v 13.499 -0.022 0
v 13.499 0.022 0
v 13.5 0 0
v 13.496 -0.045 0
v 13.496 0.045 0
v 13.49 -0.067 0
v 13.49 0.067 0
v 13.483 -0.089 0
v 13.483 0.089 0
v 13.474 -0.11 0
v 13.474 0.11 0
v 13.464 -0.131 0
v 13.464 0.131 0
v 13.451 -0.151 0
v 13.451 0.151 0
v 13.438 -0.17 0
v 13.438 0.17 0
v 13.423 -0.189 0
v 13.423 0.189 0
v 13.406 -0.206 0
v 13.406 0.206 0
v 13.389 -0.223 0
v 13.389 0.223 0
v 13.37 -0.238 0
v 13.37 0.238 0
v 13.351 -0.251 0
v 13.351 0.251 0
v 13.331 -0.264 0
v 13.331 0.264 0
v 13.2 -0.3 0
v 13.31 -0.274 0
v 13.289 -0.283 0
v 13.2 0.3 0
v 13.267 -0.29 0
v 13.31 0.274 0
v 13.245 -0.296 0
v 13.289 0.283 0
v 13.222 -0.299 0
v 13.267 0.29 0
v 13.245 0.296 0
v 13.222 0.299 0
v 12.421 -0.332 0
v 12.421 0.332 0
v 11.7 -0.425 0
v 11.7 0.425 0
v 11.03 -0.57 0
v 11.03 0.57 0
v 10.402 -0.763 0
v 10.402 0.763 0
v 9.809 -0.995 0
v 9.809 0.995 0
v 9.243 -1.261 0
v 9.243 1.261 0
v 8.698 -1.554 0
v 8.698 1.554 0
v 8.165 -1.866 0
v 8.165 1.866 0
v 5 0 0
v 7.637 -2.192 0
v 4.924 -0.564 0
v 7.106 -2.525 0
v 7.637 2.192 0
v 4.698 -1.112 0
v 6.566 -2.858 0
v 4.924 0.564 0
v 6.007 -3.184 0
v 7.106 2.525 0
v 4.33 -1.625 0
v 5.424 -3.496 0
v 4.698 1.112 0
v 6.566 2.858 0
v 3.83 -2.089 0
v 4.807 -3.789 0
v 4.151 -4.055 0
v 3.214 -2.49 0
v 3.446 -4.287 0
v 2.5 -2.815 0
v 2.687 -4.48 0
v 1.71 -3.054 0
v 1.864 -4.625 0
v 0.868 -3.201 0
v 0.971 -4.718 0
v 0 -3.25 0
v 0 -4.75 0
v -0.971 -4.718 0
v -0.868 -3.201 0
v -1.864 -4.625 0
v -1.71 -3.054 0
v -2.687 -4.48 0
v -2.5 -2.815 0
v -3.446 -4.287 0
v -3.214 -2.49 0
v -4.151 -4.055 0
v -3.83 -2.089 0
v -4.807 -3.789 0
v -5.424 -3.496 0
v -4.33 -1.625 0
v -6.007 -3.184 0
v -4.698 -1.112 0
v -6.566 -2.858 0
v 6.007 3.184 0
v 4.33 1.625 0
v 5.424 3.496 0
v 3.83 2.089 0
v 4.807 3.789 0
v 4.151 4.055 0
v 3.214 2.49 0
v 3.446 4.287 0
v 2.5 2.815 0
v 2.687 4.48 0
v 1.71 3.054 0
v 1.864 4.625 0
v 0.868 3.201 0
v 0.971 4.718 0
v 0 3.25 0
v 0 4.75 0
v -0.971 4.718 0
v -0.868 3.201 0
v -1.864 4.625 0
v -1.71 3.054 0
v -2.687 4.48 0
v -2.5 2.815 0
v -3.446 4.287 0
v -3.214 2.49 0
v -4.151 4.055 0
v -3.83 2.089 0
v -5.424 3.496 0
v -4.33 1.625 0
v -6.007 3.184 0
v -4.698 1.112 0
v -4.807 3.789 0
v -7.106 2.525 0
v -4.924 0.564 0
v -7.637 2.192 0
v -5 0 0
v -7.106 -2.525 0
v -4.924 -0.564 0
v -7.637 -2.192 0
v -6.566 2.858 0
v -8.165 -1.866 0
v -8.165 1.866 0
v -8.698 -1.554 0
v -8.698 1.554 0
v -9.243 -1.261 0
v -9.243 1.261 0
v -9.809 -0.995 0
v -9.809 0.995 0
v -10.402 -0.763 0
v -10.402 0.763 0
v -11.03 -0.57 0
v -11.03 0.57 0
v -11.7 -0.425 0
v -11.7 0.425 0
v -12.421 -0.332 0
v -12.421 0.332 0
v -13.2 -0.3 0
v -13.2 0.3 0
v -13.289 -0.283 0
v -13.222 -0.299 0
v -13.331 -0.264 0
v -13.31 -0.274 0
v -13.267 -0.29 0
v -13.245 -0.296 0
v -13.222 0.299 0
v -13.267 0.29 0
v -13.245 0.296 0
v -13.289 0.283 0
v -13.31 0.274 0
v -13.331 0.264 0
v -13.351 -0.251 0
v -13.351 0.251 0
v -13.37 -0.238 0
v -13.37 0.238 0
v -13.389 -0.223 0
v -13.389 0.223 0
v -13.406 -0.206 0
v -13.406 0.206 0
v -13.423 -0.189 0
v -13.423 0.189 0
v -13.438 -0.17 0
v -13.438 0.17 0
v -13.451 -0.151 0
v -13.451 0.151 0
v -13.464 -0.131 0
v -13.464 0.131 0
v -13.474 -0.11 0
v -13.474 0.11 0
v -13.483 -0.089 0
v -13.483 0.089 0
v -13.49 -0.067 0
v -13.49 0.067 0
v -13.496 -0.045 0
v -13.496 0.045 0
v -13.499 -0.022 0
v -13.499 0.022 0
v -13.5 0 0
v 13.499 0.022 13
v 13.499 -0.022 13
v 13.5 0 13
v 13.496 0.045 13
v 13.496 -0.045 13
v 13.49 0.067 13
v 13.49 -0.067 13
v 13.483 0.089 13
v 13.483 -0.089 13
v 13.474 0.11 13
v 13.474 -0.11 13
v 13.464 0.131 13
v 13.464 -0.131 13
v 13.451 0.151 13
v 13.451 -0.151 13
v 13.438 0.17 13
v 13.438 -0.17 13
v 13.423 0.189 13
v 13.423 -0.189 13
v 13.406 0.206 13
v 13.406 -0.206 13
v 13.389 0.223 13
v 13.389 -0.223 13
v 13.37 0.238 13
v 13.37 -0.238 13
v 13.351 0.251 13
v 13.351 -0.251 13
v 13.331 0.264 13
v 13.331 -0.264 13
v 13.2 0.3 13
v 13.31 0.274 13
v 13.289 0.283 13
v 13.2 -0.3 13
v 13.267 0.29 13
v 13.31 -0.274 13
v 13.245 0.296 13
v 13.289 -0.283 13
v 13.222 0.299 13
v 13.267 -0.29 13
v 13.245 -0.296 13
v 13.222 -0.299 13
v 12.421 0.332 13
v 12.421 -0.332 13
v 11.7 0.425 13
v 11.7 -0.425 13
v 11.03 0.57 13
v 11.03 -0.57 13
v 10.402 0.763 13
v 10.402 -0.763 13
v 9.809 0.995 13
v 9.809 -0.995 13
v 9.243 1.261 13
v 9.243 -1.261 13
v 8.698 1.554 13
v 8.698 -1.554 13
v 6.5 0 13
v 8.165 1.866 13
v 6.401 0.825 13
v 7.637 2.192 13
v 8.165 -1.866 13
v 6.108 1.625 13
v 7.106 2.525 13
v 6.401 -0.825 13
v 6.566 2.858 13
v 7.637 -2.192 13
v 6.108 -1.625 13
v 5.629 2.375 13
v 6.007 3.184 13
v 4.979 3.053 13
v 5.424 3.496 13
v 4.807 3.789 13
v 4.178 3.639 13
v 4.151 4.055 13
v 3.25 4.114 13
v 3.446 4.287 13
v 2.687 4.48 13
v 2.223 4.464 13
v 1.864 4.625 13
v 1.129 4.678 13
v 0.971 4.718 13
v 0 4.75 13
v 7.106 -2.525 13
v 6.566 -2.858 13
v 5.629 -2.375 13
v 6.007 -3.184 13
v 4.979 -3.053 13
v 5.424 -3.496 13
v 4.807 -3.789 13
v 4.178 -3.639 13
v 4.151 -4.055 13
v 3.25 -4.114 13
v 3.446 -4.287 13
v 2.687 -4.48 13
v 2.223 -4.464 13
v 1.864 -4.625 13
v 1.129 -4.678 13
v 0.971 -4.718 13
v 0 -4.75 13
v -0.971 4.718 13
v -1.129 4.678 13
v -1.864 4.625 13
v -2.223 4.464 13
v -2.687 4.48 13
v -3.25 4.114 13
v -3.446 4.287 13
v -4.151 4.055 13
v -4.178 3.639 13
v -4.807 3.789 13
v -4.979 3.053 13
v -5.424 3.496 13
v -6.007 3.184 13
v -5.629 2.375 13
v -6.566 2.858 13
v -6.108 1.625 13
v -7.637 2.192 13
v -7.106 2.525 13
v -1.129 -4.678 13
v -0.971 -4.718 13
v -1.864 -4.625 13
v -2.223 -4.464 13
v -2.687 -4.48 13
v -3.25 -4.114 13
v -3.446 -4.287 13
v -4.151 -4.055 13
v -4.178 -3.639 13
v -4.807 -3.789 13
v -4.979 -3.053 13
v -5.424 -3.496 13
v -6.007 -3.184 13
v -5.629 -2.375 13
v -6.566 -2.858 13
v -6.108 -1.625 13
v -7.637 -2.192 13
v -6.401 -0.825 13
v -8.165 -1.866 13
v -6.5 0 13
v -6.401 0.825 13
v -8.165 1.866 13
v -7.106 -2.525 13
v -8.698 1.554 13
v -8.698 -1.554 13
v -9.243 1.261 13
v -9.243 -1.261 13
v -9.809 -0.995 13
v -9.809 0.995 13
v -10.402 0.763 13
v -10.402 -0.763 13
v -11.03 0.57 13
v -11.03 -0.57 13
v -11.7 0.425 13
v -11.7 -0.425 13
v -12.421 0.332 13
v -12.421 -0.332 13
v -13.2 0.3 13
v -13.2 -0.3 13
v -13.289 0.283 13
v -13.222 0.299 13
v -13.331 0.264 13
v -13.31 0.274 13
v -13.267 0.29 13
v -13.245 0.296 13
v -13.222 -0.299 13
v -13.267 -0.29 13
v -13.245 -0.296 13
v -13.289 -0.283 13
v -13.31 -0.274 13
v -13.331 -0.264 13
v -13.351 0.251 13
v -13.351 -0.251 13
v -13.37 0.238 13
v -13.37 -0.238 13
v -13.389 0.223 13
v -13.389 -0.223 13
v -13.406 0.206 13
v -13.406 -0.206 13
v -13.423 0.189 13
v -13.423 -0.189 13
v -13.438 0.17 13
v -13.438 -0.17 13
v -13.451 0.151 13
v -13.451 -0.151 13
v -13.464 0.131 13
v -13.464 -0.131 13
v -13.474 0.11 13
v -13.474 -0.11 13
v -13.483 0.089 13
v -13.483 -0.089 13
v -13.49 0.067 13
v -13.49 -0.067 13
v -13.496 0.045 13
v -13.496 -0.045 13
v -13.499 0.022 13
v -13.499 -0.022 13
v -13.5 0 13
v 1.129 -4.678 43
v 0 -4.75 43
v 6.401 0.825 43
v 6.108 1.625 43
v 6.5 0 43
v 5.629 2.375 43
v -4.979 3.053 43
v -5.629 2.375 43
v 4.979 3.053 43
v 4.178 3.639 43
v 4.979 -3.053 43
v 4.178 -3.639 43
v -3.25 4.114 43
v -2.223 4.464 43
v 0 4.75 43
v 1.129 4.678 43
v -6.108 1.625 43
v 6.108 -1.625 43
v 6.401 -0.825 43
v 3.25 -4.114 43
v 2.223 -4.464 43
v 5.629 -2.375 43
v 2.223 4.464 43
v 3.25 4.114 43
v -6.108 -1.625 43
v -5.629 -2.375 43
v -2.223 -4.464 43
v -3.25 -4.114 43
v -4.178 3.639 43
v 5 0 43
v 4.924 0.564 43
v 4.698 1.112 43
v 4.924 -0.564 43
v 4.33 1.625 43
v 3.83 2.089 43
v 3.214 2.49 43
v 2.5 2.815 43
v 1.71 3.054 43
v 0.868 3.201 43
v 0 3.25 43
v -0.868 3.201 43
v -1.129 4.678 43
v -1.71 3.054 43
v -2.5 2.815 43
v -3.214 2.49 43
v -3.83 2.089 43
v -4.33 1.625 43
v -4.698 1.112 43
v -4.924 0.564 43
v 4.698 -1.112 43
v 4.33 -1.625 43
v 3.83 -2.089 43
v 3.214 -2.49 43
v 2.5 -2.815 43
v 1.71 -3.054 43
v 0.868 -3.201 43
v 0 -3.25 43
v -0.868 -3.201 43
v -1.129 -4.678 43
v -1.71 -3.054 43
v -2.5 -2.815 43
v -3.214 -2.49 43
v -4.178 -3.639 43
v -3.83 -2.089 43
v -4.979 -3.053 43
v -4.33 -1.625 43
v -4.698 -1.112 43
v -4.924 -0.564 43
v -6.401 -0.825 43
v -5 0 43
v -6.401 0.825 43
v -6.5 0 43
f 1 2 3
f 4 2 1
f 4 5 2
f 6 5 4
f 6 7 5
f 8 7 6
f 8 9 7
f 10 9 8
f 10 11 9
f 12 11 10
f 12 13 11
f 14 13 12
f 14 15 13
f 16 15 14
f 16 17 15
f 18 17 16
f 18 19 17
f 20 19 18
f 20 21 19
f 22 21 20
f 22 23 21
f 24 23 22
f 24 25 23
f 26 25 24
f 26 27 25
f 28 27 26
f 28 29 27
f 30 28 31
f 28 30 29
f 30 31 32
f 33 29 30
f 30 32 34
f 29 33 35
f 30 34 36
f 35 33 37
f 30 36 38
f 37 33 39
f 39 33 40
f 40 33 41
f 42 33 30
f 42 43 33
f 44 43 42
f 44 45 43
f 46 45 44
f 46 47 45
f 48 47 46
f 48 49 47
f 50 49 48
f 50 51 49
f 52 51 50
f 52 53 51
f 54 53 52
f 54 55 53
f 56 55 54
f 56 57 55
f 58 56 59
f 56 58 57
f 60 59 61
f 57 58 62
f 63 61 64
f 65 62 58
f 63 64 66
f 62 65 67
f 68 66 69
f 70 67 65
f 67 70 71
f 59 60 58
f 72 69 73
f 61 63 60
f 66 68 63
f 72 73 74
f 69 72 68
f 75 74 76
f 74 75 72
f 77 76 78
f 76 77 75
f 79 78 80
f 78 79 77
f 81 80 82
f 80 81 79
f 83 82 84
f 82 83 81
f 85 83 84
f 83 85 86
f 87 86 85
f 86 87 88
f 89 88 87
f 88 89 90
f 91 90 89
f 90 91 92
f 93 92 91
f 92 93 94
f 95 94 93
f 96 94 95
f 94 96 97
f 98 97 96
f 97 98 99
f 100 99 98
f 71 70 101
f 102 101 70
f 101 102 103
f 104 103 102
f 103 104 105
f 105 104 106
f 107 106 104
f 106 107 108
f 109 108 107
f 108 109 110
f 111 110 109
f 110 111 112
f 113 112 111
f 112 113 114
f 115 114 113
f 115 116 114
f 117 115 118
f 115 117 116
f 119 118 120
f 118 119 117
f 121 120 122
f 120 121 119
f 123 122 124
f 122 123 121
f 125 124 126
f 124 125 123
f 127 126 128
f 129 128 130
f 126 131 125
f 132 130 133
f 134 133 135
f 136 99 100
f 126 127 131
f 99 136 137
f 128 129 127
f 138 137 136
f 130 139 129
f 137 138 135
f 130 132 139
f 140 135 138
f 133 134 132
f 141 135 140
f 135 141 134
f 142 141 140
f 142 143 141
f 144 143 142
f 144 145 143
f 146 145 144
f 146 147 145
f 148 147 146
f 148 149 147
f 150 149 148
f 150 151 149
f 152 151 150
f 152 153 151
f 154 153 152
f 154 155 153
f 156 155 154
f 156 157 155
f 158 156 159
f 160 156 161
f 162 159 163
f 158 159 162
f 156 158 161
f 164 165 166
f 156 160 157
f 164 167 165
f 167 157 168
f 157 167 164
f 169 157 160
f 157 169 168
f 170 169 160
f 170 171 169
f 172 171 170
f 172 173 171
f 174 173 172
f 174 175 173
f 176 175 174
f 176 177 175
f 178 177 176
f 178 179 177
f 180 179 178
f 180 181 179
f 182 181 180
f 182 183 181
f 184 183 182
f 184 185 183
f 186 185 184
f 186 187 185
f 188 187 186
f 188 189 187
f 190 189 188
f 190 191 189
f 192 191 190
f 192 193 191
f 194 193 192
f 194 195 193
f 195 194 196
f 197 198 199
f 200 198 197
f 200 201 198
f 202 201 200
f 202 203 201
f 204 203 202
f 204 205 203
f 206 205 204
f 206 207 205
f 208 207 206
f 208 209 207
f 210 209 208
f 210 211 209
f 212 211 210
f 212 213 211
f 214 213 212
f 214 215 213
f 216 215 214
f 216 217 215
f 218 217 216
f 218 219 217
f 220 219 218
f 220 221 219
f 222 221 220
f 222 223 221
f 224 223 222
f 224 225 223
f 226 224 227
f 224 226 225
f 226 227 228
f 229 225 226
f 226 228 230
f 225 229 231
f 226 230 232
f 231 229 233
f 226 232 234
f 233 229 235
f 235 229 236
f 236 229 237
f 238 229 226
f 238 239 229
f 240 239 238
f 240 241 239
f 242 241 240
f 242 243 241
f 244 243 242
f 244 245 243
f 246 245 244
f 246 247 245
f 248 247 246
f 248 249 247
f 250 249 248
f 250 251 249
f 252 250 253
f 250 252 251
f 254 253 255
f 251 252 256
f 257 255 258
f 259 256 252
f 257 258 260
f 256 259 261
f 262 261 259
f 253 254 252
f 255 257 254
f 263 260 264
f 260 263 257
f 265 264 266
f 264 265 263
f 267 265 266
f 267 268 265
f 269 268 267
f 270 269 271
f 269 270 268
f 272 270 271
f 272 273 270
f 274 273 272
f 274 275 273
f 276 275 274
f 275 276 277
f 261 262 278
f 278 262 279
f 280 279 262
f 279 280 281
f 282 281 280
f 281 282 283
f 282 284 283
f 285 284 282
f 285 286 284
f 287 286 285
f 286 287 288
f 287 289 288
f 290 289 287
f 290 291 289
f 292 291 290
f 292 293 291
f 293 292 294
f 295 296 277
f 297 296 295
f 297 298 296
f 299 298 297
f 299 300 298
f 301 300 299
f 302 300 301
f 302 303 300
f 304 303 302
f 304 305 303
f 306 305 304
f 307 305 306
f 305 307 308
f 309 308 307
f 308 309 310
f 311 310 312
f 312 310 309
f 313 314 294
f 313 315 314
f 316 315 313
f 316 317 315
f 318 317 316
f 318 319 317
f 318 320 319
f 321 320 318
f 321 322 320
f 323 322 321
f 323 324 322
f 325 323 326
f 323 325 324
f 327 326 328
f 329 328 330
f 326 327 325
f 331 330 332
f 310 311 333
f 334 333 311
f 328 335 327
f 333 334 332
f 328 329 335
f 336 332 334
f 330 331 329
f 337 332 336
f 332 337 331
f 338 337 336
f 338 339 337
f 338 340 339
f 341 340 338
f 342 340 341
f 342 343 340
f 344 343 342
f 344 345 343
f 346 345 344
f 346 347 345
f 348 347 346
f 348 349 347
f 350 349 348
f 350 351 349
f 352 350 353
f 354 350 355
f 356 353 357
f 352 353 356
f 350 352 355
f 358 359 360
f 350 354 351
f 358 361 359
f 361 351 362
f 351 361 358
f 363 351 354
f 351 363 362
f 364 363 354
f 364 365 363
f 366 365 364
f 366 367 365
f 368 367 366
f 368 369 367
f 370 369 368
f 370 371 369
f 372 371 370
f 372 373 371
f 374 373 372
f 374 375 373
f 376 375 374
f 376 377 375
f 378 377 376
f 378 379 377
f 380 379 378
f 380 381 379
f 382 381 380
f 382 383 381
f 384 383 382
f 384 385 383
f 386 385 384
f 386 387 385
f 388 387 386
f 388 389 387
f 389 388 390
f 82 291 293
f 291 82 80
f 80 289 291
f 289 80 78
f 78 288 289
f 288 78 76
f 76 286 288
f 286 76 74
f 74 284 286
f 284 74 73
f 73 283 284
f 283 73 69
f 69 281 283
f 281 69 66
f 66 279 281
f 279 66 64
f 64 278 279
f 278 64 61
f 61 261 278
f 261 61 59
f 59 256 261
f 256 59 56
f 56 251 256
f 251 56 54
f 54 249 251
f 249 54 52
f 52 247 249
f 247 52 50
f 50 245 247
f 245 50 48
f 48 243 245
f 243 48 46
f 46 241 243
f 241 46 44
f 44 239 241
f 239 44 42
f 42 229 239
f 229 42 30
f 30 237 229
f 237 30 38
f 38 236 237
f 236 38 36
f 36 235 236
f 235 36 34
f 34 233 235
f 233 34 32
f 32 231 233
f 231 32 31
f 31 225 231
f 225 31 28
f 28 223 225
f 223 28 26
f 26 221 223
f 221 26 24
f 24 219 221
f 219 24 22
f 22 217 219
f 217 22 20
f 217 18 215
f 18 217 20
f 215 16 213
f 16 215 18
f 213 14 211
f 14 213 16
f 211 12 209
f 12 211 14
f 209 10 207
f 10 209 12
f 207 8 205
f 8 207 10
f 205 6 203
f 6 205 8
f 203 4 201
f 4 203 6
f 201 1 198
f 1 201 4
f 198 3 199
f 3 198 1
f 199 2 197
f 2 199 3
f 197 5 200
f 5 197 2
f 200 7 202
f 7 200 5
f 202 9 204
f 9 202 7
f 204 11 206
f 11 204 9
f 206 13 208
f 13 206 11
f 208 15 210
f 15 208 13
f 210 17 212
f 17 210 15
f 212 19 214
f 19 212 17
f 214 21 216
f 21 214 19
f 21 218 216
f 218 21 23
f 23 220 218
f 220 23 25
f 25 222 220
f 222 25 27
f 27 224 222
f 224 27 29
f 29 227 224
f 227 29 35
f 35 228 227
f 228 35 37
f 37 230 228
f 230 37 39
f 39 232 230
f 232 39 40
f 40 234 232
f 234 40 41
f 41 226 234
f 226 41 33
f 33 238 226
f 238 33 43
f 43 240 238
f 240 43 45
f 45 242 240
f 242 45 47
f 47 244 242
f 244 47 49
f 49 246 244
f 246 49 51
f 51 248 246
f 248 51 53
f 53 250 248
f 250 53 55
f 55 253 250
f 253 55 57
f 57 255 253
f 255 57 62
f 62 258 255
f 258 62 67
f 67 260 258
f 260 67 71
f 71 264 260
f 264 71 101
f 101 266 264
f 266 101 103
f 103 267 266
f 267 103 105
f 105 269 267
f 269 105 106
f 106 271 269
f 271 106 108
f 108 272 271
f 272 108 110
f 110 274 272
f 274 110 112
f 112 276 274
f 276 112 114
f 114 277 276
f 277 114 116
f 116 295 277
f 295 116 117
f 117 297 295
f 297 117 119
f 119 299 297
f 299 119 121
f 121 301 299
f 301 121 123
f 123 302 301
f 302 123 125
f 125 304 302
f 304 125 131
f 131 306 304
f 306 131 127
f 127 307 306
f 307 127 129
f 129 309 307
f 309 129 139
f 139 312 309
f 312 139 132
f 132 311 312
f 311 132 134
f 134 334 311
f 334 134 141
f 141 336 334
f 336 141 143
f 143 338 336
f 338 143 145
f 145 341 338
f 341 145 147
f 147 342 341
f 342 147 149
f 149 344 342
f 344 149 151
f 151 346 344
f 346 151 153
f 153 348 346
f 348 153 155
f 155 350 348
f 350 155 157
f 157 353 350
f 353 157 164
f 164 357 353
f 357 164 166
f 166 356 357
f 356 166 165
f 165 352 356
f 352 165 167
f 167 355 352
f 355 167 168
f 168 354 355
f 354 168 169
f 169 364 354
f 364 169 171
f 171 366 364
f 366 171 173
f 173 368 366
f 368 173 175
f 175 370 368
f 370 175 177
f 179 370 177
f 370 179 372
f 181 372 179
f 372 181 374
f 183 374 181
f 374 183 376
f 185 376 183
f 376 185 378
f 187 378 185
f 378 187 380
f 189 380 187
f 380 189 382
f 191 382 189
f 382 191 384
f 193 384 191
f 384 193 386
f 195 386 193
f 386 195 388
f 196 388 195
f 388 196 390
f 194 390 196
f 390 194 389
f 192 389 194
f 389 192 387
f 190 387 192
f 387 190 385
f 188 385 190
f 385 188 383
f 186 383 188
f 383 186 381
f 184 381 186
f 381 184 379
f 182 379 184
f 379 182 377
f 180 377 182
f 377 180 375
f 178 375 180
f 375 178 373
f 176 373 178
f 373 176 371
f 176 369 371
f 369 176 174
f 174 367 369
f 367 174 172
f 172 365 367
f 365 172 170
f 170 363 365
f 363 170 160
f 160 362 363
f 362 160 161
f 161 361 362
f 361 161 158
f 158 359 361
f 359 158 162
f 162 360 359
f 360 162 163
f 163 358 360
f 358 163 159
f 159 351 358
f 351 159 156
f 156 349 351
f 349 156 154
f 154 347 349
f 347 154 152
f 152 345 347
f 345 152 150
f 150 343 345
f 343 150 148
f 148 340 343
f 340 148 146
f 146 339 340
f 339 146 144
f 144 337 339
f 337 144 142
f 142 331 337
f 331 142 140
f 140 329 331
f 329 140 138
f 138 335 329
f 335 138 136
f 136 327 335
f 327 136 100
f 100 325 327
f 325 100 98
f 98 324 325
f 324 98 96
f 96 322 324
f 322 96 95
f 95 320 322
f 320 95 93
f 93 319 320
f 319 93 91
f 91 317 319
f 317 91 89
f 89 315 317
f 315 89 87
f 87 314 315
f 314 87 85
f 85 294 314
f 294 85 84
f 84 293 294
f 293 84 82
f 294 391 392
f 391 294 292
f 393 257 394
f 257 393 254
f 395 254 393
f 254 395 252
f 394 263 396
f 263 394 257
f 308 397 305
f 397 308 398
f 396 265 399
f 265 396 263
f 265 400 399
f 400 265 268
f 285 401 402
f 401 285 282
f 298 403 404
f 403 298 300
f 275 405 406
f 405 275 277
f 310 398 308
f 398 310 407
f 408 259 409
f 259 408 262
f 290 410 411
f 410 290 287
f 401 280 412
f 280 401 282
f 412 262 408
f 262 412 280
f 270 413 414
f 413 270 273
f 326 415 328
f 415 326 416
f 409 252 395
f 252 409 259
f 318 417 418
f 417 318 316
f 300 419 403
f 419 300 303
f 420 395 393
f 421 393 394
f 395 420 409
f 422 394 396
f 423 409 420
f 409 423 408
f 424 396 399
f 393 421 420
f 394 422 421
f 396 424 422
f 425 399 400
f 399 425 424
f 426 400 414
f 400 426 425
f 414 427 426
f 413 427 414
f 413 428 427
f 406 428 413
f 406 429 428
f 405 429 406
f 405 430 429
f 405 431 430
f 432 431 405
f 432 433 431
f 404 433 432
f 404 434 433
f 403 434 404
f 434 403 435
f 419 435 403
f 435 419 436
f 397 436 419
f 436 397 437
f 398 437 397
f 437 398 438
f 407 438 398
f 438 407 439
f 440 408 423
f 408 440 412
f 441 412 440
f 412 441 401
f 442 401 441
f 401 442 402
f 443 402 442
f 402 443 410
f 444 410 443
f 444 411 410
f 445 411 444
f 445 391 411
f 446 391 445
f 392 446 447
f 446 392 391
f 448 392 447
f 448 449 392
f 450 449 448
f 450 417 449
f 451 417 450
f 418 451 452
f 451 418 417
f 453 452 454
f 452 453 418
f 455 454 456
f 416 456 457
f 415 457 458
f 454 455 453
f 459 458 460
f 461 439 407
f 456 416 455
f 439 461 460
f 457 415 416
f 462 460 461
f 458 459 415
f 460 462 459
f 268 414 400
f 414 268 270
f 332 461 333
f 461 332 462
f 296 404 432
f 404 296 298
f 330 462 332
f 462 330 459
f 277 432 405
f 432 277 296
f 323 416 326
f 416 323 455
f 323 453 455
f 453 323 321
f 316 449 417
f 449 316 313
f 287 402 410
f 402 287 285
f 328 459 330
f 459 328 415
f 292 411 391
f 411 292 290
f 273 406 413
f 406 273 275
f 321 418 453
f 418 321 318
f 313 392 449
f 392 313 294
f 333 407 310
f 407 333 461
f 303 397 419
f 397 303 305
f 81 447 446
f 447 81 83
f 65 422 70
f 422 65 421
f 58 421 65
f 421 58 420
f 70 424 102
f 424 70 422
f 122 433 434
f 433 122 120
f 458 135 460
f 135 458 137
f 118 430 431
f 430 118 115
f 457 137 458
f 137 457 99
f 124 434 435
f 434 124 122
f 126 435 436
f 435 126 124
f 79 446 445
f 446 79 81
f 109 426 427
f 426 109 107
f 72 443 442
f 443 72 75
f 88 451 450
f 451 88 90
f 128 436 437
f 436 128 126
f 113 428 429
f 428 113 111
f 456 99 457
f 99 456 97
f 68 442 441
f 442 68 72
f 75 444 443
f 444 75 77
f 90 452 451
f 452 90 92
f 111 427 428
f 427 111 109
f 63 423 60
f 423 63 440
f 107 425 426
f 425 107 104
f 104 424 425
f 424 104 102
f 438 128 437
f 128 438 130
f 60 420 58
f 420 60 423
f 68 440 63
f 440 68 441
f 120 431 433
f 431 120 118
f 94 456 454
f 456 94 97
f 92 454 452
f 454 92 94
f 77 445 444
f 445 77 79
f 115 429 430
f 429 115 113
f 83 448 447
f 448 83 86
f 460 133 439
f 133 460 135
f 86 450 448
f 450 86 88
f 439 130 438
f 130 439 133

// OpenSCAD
tubeID = 10;
tubeWall = 1.5;
tubeHeight = 30;
baseHeight = 13;
baseWidth = 27;
holeAspectRatio = 0.65;
minimumWidth = 0.6;
tensionFactor1 = 0.2;
tensionFactor2 = 0.25;

module end_of_parameters_dummy() {}


//BEGIN: use <bezier.scad>;
/*
Copyright (c) 2017 Alexander R. Pruss.

Licensed under any Creative Commons Attribution license you like or under the
following MIT License.

Permission is hereby granted, free of charge, to any person obtaining a copy
of this software and associated documentation files (the "Software"), to deal
in the Software without restriction, including without limitation the rights
to use, copy, modify, merge, publish, distribute, sublicense, and/or sell
copies of the Software, and to permit persons to whom the Software is
furnished to do so, subject to the following conditions:

The above copyright notice and this permission notice shall be included in all
copies or substantial portions of the Software.

THE SOFTWARE IS PROVIDED "AS IS", WITHOUT WARRANTY OF ANY KIND, EXPRESS OR
IMPLIED, INCLUDING BUT NOT LIMITED TO THE WARRANTIES OF MERCHANTABILITY,
FITNESS FOR A PARTICULAR PURPOSE AND NONINFRINGEMENT. IN NO EVENT SHALL THE
AUTHORS OR COPYRIGHT HOLDERS BE LIABLE FOR ANY CLAIM, DAMAGES OR OTHER
LIABILITY, WHETHER IN AN ACTION OF CONTRACT, TORT OR OTHERWISE, ARISING FROM,
OUT OF OR IN CONNECTION WITH THE SOFTWARE OR THE USE OR OTHER DEALINGS IN THE
SOFTWARE.

*/


// Public domain Bezier stuff from www.thingiverse.com/thing:8443
function BEZ03(u) = pow(1-u, 3);
function BEZ13(u) = 3*u*pow(1-u,2);
function BEZ23(u) = 3*pow(u,2)*(1-u);
function BEZ33(u) = pow(u,3);
function PointAlongBez4(p0, p1, p2, p3, u) =
	BEZ03(u)*p0+BEZ13(u)*p1+BEZ23(u)*p2+BEZ33(u)*p3;
// End public domain Bezier stuff
function d2BEZ03(u) = 6*(1-u);
function d2BEZ13(u) = 18*u-12;
function d2BEZ23(u) = -18*u+6;
function d2BEZ33(u) = 6*u;

function worstCase2ndDerivative(p0, p1, p2, p3, u1, u2)
    = norm([
        for(i=[0:len(p0)-1])
            max([for(u=[u1,u2])
                d2BEZ03(u)*p0[i]+d2BEZ13(u)*p1[i]+
                d2BEZ23(u)*p2[i]+d2BEZ33(u)*p3[i]]) ]);

function neededIntervalLength(p0,p1,p2,p3,u1,u2,tolerance)
    = let(d2=worstCase2ndDerivative(p0,p1,p2,p3,u1,u2))
        d2==0 ? u2-u1+1 : sqrt(2*tolerance/d2);

function REPEAT_MIRRORED(v,angleStart=0,angleEnd=360) = ["m",v,angleStart,angleEnd];
function SMOOTH_REL(x) = ["r",x];
function SMOOTH_ABS(x) = ["a",x];
function SYMMETRIC() = ["r",1];
function OFFSET(v) = ["o",v];
function SHARP() = OFFSET([0,0,0]);
function LINE() = ["l",0];
function POLAR(r,angle) = OFFSET(r*[cos(angle),sin(angle)]);
function POINT_IS_SPECIAL(v) = (v[0]=="r" || v[0]=="a" || v[0]=="o" || v[0]=="l");

// this does NOT handle offset type points; to handle those, use DecodeBezierOffsets()
function getControlPoint(cp,node,otherCP,otherNode,nextNode) =
    let(v=node-otherCP) (
    cp[0]=="r" ? node+cp[1]*v:
    cp[0]=="a" ? (
        norm(v)<1e-9 ? node+cp[1]*(node-otherNode)/norm(node-otherNode) : node+cp[1]*v/norm(v) ) :
    cp[0]=="l" ? (2*node+nextNode)/3 :
        cp );

function onLine2(a,b,c,eps=1e-4) =
    norm(c-a) <= eps ? true
        : norm(b-a) <= eps ? false /* to be safe */
            : abs((c[1]-a[1])*(b[0]-a[0]) - (b[1]-a[1])*(c[0]-a[0])) <= eps * eps && norm(c-a) <= eps + norm(b-a);

function isStraight2(p1,c1,c2,p2,eps=1e-4) =
    len(p1) == 2 &&
    onLine2(p1,p2,c1,eps=eps) && onLine2(p2,p1,c2,eps=eps);

function Bezier2(p,index=0,precision=0.05,rightEndPoint=true,optimize=true) = let(nPoints=
        max(1, precision < 0 ?
                    ceil(1/
                        neededIntervalLength(p[index],p[index+1],p[index+2],p[index+3],0,1,-precision))
                    : ceil(1/precision)) )
    optimize && isStraight2(p[index],p[index+1],p[index+2],p[index+3]) ? (rightEndPoint?[p[index+0],p[index+3]]:[p[index+0]] ) :
    [for (i=[0:nPoints-(rightEndPoint?0:1)]) PointAlongBez4(p[index+0],p[index+1],p[index+2],p[index+3],i/nPoints)];

function flatten(listOfLists) = [ for(list = listOfLists) for(item = list) item ];


// p is a list of points, in the format:
// [node1,control1,control2,node2,control3, control4,node3, ...]
// You can replace inner control points with:
//   SYMMETRIC: uses a reflection of the control point on the other side of the node
//   SMOOTH_REL(x): like SYMMETRIC, but the distance of the control point to the node is x times the distance of the other control point to the node
//   SMOOTH_ABS(x): like SYMMETRIC, but the distance of the control point to the node is exactly x
// You can also replace any control point with:
//   OFFSET(v): puts the control point at the corresponding node plus the vector v
//   SHARP(): equivalent to OFFSET([0,0])
//   LINE(): when used for both control points between two nodes, generates a straight line
//   POLAR(r,angle): like OFFSET, except the offset is specified in polar coordinates

function DecodeBezierOffset(control,node) = control[0] == "o" ? node+control[1] : control;

function _mirrorMatrix(normalVector) = let(v = normalVector/norm(normalVector)) len(v)<3 ? [[1-2*v[0]*v[0],-2*v[0]*v[1]],[-2*v[0]*v[1],1-2*v[1]*v[1]]] : [[1-2*v[0]*v[0],-2*v[0]*v[1],-2*v[0]*v[2]],[-2*v[0]*v[1],1-2*v[1]*v[1],-2*v[1]*v[2]],[-2*v[0]*v[2],-2*v[1]*v[2],1-2*v[2]*v[2]]];

function _correctLength(p,start=0) =
    start >= len(p) || p[start][0] == "m" ? 3*floor(start/3)+1 : _correctLength(p,start=start+1);

function _trimArray(a, n) = [for (i=[0:n-1]) a[i]];

function _transformPoint(matrix,a) =
    let(n=len(a))
        len(matrix[0])==n+1 ?
            _trimArray(matrix * concat(a,[1]), n)
            : matrix * a;

function _transformPath(matrix,path) =
    [for (a=path) _transformPoint(matrix,a)];

function _reverseArray(array) = let(n=len(array)) [for (i=[0:n-1]) array[n-1-i]];

function _stitchPaths(a,b) = let(na=len(a)) [for (i=[0:na+len(b)-2]) i<na? a[i] : b[i-na+1]-b[0]+a[na-1]];

// replace all OFFSET/SHARP/POLAR points with coordinates
function DecodeBezierOffsets(p) = [for (i=[0:_correctLength(p)-1]) i%3==0?p[i]:(i%3==1?DecodeBezierOffset(p[i],p[i-1]):DecodeBezierOffset(p[i],p[i+1]))];

function _mirrorPaths(basePath, control, start) =
    control[start][0] == "m" ? _mirrorPaths(_stitchPaths(basePath,_reverseArray(_transformPath(_mirrorMatrix( control[start][1] ),basePath))), control, start+1) : basePath;

function DecodeSpecialBezierPoints(p0) =
    let(
        l = _correctLength(p0),
        doMirror = len(p0)>l && p0[l][0] == "m",
        p=DecodeBezierOffsets(p0),
        basePath = [for (i=[0:l-1]) i%3==0?p[i]:(i%3==1?getControlPoint(p[i],p[i-1],p[i-2],p[i-4],p[i+2]):getControlPoint(p[i],p[i+1],p[i+2],p[i+4],p[i-2]))])
        doMirror ? _mirrorPaths(basePath, p0, l) : basePath;

function Distance2D(a,b) = sqrt((a[0]-b[0])*(a[0]-b[0])+(a[1]-b[1])*(a[1]-b[1]));

function RemoveDuplicates(p,eps=0.00001) = let(safeEps = eps/len(p)) [for (i=[0:len(p)-1]) if(i==0 || i==len(p)-1 || Distance2D(p[i-1],p[i]) >= safeEps) p[i]];

function Bezier(p,precision=0.05,eps=0.00001,optimize=true) = let(q=DecodeSpecialBezierPoints(p), nodes=(len(q)-1)/3) RemoveDuplicates(flatten([for (i=[0:nodes-1]) Bezier2(q,optimize=optimize,index=i*3,precision=precision,rightEndPoint=(i==nodes-1))]),eps=eps);

function GetSplineAngle(a,b,c) =
    a==c && b==a ? 0 :
    a==c ? let(ba=b-a) atan2(ba[1],ba[0]) :
    let(ca=c-a) atan2(ca[1],ca[0]);

/*    let(ba=norm(b-a),cb=norm(c-b))
        ba == 0 && cb == 0 ? 0 :
    let(v = ba == 0 ? c-b :
            cb == 0 ? b-a :
            (c-b)*norm(b-a)/norm(c-b)+(b-a))
    atan2(v[1],v[0]); */

// do a spline around b
function SplineAroundPoint(a,b,c,tension=0.5,includeLeftCP=true,includeRightCP=true) =
    includeLeftCP && includeRightCP ?
        [POLAR(tension*norm(a-b),GetSplineAngle(c,b,a)),b,POLAR(tension*norm(c-b),GetSplineAngle(a,b,c))] :
    includeLeftCP ?
        [POLAR(tension*norm(a-b),GetSplineAngle(c,b,a)),b] :
    includeRightCP ?
        [b,POLAR(tension*norm(c-b),GetSplineAngle(a,b,c))] :
        [b];

function BezierSmoothPoints(points,tension=0.5,closed=false)
    = let (n=len(points))
        flatten(
        closed ? [ for (i=[0:n]) SplineAroundPoint(points[(n+i-1)%n],points[i%n],points[(i+1)%n],tension=tension,includeLeftCP=i>0,includeRightCP=i<n) ] :
        [ for (i=[0:n-1])
            SplineAroundPoint(
            i==0 ? 2*points[0]-points[1] : points[(n+i-1)%n],
            points[i],
            i==n-1 ? 2*points[n-1]-points[n-2] : points[(i+1)%n],tension=tension,includeLeftCP=i>0,includeRightCP=i<n-1  ) ]);

module BezierVisualize(p,precision=0.05,eps=0.00001,lineThickness=0.25,controlLineThickness=0.125,nodeSize=1) {
    $fn = 16;
    dim = len(p[0]);
    module point(size) {
        if (dim==2)
            circle(d=size);
        else
            sphere(d=size);
    }
    p1 = DecodeSpecialBezierPoints(p);
    l = Bezier(p1,precision=precision,eps=eps);
    for (i=[0:len(l)-2]) {
        hull() {
            translate(l[i]) point(lineThickness);
            translate(l[i+1]) point(lineThickness);
        }
    }
    for (i=[0:len(p1)-1]) {
        if (i%3 == 0) {
            color("black") translate(p1[i]) point(nodeSize);
        }
        else {
            node = i%3 == 1 ? i-1 : i+1;
            color("red") translate(p1[i]) point(nodeSize);
            color("red") hull() {
                translate(p1[node]) point(controlLineThickness);
                translate(p1[i]) point(controlLineThickness);
            }
        }
    }
}


//END: use <bezier.scad>;



module dummy() {}
$fn = 36;

tubeH = tubeID * holeAspectRatio + tubeWall*2;
tubeW = tubeID + tubeWall*2;

module base() {
    polygon(Bezier([[-baseWidth/2,0],
    POLAR(minimumWidth/4,90),POLAR(minimumWidth/4,180),[-baseWidth/2+minimumWidth/2,minimumWidth/2],
    POLAR(baseWidth*tensionFactor1,0),POLAR(baseWidth*tensionFactor2,180),[0,tubeH/2],REPEAT_MIRRORED([1,0]),REPEAT_MIRRORED([0,-1])]));
}

difference() {
    union() {
        linear_extrude(height=baseHeight)
        base();
        scale([1,tubeH/tubeW,1])
        cylinder(d=tubeW,h=tubeHeight+baseHeight);
    }
    scale([1,holeAspectRatio,1])
    cylinder(d=tubeID,h=4*(tubeHeight+baseHeight),center=true);
}
